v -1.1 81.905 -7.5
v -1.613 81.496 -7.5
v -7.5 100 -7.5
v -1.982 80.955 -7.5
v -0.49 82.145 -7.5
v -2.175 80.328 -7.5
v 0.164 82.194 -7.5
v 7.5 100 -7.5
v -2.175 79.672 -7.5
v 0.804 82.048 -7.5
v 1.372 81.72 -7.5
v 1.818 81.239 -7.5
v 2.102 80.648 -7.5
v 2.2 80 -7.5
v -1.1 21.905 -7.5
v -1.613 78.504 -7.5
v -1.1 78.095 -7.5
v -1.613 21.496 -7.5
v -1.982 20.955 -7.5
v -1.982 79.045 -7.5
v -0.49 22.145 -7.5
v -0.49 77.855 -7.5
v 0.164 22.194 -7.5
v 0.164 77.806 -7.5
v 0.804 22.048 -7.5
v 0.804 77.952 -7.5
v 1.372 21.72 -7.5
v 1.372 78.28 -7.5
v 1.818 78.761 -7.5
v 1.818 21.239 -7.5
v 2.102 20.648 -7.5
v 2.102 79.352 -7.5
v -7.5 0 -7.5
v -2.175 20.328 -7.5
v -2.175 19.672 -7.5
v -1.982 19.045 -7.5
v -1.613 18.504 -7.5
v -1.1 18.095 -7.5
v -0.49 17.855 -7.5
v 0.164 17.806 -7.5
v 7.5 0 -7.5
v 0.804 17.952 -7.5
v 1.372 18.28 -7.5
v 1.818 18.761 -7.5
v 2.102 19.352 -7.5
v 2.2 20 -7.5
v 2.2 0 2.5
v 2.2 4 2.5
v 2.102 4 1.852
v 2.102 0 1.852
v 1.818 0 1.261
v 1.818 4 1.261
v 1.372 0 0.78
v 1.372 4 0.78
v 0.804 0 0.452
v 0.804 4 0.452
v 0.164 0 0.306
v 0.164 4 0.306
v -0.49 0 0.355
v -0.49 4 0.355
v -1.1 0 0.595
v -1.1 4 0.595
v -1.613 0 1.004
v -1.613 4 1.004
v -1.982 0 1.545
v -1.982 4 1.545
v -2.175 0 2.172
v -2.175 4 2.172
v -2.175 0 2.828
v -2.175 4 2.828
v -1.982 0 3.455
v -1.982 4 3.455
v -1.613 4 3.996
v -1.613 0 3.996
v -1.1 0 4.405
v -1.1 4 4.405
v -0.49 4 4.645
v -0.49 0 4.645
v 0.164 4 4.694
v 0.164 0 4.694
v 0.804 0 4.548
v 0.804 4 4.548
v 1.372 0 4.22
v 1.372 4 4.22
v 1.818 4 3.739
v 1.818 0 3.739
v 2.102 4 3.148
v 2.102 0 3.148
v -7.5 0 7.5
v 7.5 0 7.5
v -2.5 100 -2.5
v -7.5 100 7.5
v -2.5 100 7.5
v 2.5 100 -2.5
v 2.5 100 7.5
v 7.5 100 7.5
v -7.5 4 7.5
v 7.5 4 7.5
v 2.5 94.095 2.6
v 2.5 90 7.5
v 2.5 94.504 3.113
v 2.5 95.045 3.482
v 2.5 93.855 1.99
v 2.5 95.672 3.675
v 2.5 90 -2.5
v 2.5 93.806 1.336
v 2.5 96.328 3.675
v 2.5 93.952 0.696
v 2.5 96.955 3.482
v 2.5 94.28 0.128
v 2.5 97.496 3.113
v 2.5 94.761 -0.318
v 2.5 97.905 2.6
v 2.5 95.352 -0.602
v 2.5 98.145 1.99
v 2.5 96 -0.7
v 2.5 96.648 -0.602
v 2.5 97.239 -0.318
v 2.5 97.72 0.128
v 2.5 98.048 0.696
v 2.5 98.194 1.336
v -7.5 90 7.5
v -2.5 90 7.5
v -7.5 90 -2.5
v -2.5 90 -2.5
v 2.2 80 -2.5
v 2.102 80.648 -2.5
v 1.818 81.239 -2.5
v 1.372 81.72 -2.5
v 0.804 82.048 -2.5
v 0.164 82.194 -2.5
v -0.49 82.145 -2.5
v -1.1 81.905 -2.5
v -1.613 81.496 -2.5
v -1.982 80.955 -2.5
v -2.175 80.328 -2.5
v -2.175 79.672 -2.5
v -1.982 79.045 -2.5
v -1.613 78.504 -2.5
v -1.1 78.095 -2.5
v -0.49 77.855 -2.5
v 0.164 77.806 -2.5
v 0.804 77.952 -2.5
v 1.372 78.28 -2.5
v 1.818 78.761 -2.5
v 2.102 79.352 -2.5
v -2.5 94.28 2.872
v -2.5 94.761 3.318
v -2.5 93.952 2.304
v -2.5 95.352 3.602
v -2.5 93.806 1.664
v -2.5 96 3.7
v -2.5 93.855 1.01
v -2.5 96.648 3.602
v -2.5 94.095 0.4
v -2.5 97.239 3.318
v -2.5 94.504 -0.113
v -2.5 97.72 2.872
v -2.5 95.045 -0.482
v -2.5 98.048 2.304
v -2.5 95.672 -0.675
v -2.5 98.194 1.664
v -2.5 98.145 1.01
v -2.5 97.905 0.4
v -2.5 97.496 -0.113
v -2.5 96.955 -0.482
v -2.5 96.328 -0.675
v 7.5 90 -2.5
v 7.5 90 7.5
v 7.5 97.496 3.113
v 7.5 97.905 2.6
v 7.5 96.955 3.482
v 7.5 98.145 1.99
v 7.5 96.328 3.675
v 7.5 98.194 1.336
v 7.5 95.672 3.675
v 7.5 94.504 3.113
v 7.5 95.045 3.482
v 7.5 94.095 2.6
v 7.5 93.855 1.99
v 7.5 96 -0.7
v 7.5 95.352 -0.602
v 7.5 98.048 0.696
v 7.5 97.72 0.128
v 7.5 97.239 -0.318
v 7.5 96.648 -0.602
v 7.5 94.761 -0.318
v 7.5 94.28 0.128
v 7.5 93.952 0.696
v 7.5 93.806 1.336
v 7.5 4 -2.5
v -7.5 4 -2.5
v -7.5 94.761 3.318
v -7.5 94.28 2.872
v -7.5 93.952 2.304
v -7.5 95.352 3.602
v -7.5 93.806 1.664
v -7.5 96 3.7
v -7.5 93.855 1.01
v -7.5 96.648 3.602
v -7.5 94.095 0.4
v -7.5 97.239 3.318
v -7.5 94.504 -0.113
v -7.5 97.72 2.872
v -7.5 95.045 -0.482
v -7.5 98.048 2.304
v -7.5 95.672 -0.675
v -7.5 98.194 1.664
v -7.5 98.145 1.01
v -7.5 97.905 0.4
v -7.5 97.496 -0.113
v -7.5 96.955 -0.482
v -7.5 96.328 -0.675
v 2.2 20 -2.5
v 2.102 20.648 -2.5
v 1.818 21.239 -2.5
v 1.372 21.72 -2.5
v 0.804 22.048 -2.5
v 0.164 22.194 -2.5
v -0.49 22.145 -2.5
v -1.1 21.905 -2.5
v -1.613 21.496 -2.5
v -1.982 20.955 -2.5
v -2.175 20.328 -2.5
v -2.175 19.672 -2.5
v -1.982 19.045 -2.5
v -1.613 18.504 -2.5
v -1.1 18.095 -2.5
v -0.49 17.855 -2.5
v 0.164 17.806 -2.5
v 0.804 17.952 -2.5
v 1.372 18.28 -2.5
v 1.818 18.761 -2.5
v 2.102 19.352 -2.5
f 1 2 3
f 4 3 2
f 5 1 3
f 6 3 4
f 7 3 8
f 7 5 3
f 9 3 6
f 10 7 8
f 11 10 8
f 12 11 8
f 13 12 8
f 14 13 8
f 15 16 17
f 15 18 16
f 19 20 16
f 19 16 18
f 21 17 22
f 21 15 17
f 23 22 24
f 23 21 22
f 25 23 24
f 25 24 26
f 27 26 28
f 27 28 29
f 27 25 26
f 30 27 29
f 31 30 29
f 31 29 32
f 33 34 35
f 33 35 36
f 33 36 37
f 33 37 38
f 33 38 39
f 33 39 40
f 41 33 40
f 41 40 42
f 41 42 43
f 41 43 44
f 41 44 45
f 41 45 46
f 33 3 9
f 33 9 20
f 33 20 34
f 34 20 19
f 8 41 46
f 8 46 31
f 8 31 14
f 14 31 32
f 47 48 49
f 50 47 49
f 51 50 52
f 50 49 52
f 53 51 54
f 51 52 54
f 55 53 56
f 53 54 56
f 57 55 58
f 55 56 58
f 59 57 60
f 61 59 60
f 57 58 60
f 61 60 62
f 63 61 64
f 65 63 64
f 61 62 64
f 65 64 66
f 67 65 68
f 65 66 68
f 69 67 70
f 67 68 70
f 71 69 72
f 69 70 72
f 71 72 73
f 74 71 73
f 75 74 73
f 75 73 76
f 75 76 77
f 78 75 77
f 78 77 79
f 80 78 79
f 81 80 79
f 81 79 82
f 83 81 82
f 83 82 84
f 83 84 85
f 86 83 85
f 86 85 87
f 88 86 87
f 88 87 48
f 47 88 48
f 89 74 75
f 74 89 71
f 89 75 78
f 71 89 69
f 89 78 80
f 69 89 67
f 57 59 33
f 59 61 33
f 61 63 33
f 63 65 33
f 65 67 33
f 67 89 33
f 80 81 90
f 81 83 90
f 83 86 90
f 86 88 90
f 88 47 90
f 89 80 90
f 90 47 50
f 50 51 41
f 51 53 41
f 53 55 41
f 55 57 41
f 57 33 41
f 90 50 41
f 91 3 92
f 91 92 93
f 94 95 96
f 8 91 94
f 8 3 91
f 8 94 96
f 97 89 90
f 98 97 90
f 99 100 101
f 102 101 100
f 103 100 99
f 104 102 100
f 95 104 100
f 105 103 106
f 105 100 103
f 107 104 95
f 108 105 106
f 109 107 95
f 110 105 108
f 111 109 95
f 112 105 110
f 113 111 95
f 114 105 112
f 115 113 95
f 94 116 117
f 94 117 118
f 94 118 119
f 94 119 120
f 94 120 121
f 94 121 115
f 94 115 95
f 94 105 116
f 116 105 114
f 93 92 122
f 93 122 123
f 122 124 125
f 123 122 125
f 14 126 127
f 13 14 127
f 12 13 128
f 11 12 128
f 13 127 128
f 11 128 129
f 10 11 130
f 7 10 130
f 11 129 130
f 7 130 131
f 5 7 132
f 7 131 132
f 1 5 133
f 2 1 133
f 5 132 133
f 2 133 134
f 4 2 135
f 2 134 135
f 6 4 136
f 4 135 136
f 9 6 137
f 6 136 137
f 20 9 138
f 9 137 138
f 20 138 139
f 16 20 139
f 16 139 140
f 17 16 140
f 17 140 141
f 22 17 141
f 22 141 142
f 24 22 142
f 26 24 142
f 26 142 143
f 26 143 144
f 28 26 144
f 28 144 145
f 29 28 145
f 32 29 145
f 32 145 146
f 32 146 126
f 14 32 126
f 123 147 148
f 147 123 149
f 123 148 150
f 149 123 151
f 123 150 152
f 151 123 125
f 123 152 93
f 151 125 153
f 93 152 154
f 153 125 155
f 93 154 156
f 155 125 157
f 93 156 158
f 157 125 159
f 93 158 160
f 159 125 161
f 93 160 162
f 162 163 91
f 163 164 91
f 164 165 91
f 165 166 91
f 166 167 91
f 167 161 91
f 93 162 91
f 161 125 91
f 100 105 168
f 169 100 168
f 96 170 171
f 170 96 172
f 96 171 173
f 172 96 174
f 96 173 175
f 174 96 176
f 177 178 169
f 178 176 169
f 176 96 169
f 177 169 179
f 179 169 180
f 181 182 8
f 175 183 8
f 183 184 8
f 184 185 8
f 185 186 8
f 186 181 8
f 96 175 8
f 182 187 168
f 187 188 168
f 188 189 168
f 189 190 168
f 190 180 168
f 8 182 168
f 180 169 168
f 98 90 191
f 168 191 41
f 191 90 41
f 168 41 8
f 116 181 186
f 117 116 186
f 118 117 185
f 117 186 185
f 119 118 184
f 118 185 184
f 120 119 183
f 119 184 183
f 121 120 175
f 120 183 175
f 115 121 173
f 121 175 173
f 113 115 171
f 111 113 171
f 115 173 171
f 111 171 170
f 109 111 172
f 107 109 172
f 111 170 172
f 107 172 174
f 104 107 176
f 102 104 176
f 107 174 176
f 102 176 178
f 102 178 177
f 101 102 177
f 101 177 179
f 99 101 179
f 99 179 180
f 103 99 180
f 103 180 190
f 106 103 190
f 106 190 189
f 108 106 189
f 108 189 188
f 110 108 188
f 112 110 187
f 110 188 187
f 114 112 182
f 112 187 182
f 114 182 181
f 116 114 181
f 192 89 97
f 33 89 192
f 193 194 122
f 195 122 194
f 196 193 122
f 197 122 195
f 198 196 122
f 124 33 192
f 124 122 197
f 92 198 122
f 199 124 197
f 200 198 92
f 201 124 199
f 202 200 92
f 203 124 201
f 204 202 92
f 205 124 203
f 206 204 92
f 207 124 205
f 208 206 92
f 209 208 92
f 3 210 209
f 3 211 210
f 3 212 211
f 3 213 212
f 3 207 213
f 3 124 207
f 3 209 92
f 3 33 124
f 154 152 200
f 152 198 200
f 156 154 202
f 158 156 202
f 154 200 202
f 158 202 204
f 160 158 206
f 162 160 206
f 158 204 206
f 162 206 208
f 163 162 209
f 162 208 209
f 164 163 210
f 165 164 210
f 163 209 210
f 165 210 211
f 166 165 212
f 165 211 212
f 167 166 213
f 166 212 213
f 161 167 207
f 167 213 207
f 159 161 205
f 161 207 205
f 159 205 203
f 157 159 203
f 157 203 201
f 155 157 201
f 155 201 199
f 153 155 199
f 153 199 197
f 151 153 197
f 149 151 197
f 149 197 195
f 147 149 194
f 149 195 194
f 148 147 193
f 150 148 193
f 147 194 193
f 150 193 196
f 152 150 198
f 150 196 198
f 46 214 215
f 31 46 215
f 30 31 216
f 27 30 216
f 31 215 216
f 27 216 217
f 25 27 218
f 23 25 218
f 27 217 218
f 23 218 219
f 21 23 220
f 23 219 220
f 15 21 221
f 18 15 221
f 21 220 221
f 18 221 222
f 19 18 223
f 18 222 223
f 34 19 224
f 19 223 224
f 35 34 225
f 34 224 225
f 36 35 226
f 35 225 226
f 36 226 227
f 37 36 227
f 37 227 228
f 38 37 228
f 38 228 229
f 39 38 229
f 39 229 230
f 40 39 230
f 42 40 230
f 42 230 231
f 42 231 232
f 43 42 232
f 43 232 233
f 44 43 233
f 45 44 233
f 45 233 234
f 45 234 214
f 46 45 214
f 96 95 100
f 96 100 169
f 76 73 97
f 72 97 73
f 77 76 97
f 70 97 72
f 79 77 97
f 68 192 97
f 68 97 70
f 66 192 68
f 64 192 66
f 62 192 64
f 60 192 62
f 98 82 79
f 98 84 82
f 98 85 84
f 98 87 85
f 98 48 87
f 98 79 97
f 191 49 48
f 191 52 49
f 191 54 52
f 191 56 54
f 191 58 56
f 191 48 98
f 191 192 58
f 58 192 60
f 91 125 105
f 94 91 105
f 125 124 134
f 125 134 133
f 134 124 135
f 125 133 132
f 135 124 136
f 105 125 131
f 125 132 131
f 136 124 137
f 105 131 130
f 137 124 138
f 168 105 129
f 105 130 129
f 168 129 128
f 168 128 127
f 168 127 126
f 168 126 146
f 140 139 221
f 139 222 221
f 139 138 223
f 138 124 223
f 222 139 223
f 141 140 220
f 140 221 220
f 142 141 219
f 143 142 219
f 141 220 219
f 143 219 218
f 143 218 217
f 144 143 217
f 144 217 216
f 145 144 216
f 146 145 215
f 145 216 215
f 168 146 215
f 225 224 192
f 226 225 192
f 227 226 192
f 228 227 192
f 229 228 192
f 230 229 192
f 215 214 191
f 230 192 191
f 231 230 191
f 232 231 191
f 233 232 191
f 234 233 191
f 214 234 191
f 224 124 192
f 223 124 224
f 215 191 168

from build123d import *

# Parameters (mm, degrees)
SKIZZE1_W                       = 15
SKIZZE1_H                       = 15
AUFSATZ_LINEAR_AUSTRAGEN1_DEPTH = 4
SKIZZE2_W                       = 15
SKIZZE2_H                       = 5
AUFSATZ_LINEAR_AUSTRAGEN2_DEPTH = 96
SKIZZE3_W                       = 5
SKIZZE3_H                       = 10
AUFSATZ_LINEAR_AUSTRAGEN3_DEPTH = 10
SKIZZE4_R                       = 2.2
SCHNITT_LINEAR_AUSTRAGEN1_DEPTH = 5
SCHNITT_LINEAR_AUSTRAGEN2_REACH = 17
SKIZZE5_R                       = 2.2
SKIZZE6_R                       = 2.2
SCHNITT_LINEAR_AUSTRAGEN3_DEPTH = 16
SKIZZE7_R                       = 2.2
SCHNITT_LINEAR_AUSTRAGEN4_DEPTH = 6


with BuildPart() as part:
    # Skizze1 → Aufsatz-Linear austragen1 (new body)
    with BuildSketch(Plane(origin=(0, 0, 0), x_dir=(1, 0, 0), z_dir=(0, 1, 0))):
        Rectangle(SKIZZE1_W, SKIZZE1_H)
    extrude(amount=AUFSATZ_LINEAR_AUSTRAGEN1_DEPTH)

    # Skizze2 → Aufsatz-Linear austragen2 (add)
    with BuildSketch(Plane(origin=(0, 4, 0), x_dir=(1, 0, 0), z_dir=(0, 1, 0))):
        with Locations((0, 5)):
            Rectangle(SKIZZE2_W, SKIZZE2_H)
    extrude(amount=AUFSATZ_LINEAR_AUSTRAGEN2_DEPTH)

    # Skizze3 → Aufsatz-Linear austragen3 (add)
    with BuildSketch(Plane.XY.offset(-2.5)):
        with Locations((-5, 95)):
            Rectangle(SKIZZE3_W, SKIZZE3_H)
        with Locations((5, 95)):
            Rectangle(SKIZZE3_W, SKIZZE3_H)
    extrude(amount=AUFSATZ_LINEAR_AUSTRAGEN3_DEPTH)

    # Skizze4 → Schnitt-Linear austragen1 (cut, through all)
    with BuildSketch(Plane(origin=(0, 4, 0), x_dir=(1, 0, 0), z_dir=(0, 1, 0))):
        with Locations((0, -2.5)):
            Circle(SKIZZE4_R)
    extrude(amount=-SCHNITT_LINEAR_AUSTRAGEN1_DEPTH, mode=Mode.SUBTRACT)

    # Skizze5 → Schnitt-Linear austragen2 (cut, up to next)
    with BuildSketch(Plane(origin=(7.5, 0, 0), x_dir=(0, 0, -1), z_dir=(1, 0, 0)), mode=Mode.PRIVATE) as schnitt_linear_austragen2_sk1:
        with Locations((-1.5, 96)):
            Circle(SKIZZE5_R)
    schnitt_linear_austragen2_tool1 = extrude(schnitt_linear_austragen2_sk1.sketch, amount=-SCHNITT_LINEAR_AUSTRAGEN2_REACH, mode=Mode.PRIVATE) & part.part
    add(schnitt_linear_austragen2_tool1.solids().sort_by_distance((7.5, 96, 1.5))[0], mode=Mode.SUBTRACT)

    # Skizze6 → Schnitt-Linear austragen3 (cut, through all)
    with BuildSketch(Plane.ZY.offset(7.5)):
        with Locations((1.5, 96)):
            Circle(SKIZZE6_R)
    extrude(amount=-SCHNITT_LINEAR_AUSTRAGEN3_DEPTH, mode=Mode.SUBTRACT)

    # Skizze7 → Schnitt-Linear austragen4 (cut, through all)
    with BuildSketch(Plane.XY.offset(-2.5)):
        with Locations((0, 20)):
            Circle(SKIZZE7_R)
        with Locations((0, 80)):
            Circle(SKIZZE7_R)
    extrude(amount=-SCHNITT_LINEAR_AUSTRAGEN4_DEPTH, mode=Mode.SUBTRACT)


solid = part.part
